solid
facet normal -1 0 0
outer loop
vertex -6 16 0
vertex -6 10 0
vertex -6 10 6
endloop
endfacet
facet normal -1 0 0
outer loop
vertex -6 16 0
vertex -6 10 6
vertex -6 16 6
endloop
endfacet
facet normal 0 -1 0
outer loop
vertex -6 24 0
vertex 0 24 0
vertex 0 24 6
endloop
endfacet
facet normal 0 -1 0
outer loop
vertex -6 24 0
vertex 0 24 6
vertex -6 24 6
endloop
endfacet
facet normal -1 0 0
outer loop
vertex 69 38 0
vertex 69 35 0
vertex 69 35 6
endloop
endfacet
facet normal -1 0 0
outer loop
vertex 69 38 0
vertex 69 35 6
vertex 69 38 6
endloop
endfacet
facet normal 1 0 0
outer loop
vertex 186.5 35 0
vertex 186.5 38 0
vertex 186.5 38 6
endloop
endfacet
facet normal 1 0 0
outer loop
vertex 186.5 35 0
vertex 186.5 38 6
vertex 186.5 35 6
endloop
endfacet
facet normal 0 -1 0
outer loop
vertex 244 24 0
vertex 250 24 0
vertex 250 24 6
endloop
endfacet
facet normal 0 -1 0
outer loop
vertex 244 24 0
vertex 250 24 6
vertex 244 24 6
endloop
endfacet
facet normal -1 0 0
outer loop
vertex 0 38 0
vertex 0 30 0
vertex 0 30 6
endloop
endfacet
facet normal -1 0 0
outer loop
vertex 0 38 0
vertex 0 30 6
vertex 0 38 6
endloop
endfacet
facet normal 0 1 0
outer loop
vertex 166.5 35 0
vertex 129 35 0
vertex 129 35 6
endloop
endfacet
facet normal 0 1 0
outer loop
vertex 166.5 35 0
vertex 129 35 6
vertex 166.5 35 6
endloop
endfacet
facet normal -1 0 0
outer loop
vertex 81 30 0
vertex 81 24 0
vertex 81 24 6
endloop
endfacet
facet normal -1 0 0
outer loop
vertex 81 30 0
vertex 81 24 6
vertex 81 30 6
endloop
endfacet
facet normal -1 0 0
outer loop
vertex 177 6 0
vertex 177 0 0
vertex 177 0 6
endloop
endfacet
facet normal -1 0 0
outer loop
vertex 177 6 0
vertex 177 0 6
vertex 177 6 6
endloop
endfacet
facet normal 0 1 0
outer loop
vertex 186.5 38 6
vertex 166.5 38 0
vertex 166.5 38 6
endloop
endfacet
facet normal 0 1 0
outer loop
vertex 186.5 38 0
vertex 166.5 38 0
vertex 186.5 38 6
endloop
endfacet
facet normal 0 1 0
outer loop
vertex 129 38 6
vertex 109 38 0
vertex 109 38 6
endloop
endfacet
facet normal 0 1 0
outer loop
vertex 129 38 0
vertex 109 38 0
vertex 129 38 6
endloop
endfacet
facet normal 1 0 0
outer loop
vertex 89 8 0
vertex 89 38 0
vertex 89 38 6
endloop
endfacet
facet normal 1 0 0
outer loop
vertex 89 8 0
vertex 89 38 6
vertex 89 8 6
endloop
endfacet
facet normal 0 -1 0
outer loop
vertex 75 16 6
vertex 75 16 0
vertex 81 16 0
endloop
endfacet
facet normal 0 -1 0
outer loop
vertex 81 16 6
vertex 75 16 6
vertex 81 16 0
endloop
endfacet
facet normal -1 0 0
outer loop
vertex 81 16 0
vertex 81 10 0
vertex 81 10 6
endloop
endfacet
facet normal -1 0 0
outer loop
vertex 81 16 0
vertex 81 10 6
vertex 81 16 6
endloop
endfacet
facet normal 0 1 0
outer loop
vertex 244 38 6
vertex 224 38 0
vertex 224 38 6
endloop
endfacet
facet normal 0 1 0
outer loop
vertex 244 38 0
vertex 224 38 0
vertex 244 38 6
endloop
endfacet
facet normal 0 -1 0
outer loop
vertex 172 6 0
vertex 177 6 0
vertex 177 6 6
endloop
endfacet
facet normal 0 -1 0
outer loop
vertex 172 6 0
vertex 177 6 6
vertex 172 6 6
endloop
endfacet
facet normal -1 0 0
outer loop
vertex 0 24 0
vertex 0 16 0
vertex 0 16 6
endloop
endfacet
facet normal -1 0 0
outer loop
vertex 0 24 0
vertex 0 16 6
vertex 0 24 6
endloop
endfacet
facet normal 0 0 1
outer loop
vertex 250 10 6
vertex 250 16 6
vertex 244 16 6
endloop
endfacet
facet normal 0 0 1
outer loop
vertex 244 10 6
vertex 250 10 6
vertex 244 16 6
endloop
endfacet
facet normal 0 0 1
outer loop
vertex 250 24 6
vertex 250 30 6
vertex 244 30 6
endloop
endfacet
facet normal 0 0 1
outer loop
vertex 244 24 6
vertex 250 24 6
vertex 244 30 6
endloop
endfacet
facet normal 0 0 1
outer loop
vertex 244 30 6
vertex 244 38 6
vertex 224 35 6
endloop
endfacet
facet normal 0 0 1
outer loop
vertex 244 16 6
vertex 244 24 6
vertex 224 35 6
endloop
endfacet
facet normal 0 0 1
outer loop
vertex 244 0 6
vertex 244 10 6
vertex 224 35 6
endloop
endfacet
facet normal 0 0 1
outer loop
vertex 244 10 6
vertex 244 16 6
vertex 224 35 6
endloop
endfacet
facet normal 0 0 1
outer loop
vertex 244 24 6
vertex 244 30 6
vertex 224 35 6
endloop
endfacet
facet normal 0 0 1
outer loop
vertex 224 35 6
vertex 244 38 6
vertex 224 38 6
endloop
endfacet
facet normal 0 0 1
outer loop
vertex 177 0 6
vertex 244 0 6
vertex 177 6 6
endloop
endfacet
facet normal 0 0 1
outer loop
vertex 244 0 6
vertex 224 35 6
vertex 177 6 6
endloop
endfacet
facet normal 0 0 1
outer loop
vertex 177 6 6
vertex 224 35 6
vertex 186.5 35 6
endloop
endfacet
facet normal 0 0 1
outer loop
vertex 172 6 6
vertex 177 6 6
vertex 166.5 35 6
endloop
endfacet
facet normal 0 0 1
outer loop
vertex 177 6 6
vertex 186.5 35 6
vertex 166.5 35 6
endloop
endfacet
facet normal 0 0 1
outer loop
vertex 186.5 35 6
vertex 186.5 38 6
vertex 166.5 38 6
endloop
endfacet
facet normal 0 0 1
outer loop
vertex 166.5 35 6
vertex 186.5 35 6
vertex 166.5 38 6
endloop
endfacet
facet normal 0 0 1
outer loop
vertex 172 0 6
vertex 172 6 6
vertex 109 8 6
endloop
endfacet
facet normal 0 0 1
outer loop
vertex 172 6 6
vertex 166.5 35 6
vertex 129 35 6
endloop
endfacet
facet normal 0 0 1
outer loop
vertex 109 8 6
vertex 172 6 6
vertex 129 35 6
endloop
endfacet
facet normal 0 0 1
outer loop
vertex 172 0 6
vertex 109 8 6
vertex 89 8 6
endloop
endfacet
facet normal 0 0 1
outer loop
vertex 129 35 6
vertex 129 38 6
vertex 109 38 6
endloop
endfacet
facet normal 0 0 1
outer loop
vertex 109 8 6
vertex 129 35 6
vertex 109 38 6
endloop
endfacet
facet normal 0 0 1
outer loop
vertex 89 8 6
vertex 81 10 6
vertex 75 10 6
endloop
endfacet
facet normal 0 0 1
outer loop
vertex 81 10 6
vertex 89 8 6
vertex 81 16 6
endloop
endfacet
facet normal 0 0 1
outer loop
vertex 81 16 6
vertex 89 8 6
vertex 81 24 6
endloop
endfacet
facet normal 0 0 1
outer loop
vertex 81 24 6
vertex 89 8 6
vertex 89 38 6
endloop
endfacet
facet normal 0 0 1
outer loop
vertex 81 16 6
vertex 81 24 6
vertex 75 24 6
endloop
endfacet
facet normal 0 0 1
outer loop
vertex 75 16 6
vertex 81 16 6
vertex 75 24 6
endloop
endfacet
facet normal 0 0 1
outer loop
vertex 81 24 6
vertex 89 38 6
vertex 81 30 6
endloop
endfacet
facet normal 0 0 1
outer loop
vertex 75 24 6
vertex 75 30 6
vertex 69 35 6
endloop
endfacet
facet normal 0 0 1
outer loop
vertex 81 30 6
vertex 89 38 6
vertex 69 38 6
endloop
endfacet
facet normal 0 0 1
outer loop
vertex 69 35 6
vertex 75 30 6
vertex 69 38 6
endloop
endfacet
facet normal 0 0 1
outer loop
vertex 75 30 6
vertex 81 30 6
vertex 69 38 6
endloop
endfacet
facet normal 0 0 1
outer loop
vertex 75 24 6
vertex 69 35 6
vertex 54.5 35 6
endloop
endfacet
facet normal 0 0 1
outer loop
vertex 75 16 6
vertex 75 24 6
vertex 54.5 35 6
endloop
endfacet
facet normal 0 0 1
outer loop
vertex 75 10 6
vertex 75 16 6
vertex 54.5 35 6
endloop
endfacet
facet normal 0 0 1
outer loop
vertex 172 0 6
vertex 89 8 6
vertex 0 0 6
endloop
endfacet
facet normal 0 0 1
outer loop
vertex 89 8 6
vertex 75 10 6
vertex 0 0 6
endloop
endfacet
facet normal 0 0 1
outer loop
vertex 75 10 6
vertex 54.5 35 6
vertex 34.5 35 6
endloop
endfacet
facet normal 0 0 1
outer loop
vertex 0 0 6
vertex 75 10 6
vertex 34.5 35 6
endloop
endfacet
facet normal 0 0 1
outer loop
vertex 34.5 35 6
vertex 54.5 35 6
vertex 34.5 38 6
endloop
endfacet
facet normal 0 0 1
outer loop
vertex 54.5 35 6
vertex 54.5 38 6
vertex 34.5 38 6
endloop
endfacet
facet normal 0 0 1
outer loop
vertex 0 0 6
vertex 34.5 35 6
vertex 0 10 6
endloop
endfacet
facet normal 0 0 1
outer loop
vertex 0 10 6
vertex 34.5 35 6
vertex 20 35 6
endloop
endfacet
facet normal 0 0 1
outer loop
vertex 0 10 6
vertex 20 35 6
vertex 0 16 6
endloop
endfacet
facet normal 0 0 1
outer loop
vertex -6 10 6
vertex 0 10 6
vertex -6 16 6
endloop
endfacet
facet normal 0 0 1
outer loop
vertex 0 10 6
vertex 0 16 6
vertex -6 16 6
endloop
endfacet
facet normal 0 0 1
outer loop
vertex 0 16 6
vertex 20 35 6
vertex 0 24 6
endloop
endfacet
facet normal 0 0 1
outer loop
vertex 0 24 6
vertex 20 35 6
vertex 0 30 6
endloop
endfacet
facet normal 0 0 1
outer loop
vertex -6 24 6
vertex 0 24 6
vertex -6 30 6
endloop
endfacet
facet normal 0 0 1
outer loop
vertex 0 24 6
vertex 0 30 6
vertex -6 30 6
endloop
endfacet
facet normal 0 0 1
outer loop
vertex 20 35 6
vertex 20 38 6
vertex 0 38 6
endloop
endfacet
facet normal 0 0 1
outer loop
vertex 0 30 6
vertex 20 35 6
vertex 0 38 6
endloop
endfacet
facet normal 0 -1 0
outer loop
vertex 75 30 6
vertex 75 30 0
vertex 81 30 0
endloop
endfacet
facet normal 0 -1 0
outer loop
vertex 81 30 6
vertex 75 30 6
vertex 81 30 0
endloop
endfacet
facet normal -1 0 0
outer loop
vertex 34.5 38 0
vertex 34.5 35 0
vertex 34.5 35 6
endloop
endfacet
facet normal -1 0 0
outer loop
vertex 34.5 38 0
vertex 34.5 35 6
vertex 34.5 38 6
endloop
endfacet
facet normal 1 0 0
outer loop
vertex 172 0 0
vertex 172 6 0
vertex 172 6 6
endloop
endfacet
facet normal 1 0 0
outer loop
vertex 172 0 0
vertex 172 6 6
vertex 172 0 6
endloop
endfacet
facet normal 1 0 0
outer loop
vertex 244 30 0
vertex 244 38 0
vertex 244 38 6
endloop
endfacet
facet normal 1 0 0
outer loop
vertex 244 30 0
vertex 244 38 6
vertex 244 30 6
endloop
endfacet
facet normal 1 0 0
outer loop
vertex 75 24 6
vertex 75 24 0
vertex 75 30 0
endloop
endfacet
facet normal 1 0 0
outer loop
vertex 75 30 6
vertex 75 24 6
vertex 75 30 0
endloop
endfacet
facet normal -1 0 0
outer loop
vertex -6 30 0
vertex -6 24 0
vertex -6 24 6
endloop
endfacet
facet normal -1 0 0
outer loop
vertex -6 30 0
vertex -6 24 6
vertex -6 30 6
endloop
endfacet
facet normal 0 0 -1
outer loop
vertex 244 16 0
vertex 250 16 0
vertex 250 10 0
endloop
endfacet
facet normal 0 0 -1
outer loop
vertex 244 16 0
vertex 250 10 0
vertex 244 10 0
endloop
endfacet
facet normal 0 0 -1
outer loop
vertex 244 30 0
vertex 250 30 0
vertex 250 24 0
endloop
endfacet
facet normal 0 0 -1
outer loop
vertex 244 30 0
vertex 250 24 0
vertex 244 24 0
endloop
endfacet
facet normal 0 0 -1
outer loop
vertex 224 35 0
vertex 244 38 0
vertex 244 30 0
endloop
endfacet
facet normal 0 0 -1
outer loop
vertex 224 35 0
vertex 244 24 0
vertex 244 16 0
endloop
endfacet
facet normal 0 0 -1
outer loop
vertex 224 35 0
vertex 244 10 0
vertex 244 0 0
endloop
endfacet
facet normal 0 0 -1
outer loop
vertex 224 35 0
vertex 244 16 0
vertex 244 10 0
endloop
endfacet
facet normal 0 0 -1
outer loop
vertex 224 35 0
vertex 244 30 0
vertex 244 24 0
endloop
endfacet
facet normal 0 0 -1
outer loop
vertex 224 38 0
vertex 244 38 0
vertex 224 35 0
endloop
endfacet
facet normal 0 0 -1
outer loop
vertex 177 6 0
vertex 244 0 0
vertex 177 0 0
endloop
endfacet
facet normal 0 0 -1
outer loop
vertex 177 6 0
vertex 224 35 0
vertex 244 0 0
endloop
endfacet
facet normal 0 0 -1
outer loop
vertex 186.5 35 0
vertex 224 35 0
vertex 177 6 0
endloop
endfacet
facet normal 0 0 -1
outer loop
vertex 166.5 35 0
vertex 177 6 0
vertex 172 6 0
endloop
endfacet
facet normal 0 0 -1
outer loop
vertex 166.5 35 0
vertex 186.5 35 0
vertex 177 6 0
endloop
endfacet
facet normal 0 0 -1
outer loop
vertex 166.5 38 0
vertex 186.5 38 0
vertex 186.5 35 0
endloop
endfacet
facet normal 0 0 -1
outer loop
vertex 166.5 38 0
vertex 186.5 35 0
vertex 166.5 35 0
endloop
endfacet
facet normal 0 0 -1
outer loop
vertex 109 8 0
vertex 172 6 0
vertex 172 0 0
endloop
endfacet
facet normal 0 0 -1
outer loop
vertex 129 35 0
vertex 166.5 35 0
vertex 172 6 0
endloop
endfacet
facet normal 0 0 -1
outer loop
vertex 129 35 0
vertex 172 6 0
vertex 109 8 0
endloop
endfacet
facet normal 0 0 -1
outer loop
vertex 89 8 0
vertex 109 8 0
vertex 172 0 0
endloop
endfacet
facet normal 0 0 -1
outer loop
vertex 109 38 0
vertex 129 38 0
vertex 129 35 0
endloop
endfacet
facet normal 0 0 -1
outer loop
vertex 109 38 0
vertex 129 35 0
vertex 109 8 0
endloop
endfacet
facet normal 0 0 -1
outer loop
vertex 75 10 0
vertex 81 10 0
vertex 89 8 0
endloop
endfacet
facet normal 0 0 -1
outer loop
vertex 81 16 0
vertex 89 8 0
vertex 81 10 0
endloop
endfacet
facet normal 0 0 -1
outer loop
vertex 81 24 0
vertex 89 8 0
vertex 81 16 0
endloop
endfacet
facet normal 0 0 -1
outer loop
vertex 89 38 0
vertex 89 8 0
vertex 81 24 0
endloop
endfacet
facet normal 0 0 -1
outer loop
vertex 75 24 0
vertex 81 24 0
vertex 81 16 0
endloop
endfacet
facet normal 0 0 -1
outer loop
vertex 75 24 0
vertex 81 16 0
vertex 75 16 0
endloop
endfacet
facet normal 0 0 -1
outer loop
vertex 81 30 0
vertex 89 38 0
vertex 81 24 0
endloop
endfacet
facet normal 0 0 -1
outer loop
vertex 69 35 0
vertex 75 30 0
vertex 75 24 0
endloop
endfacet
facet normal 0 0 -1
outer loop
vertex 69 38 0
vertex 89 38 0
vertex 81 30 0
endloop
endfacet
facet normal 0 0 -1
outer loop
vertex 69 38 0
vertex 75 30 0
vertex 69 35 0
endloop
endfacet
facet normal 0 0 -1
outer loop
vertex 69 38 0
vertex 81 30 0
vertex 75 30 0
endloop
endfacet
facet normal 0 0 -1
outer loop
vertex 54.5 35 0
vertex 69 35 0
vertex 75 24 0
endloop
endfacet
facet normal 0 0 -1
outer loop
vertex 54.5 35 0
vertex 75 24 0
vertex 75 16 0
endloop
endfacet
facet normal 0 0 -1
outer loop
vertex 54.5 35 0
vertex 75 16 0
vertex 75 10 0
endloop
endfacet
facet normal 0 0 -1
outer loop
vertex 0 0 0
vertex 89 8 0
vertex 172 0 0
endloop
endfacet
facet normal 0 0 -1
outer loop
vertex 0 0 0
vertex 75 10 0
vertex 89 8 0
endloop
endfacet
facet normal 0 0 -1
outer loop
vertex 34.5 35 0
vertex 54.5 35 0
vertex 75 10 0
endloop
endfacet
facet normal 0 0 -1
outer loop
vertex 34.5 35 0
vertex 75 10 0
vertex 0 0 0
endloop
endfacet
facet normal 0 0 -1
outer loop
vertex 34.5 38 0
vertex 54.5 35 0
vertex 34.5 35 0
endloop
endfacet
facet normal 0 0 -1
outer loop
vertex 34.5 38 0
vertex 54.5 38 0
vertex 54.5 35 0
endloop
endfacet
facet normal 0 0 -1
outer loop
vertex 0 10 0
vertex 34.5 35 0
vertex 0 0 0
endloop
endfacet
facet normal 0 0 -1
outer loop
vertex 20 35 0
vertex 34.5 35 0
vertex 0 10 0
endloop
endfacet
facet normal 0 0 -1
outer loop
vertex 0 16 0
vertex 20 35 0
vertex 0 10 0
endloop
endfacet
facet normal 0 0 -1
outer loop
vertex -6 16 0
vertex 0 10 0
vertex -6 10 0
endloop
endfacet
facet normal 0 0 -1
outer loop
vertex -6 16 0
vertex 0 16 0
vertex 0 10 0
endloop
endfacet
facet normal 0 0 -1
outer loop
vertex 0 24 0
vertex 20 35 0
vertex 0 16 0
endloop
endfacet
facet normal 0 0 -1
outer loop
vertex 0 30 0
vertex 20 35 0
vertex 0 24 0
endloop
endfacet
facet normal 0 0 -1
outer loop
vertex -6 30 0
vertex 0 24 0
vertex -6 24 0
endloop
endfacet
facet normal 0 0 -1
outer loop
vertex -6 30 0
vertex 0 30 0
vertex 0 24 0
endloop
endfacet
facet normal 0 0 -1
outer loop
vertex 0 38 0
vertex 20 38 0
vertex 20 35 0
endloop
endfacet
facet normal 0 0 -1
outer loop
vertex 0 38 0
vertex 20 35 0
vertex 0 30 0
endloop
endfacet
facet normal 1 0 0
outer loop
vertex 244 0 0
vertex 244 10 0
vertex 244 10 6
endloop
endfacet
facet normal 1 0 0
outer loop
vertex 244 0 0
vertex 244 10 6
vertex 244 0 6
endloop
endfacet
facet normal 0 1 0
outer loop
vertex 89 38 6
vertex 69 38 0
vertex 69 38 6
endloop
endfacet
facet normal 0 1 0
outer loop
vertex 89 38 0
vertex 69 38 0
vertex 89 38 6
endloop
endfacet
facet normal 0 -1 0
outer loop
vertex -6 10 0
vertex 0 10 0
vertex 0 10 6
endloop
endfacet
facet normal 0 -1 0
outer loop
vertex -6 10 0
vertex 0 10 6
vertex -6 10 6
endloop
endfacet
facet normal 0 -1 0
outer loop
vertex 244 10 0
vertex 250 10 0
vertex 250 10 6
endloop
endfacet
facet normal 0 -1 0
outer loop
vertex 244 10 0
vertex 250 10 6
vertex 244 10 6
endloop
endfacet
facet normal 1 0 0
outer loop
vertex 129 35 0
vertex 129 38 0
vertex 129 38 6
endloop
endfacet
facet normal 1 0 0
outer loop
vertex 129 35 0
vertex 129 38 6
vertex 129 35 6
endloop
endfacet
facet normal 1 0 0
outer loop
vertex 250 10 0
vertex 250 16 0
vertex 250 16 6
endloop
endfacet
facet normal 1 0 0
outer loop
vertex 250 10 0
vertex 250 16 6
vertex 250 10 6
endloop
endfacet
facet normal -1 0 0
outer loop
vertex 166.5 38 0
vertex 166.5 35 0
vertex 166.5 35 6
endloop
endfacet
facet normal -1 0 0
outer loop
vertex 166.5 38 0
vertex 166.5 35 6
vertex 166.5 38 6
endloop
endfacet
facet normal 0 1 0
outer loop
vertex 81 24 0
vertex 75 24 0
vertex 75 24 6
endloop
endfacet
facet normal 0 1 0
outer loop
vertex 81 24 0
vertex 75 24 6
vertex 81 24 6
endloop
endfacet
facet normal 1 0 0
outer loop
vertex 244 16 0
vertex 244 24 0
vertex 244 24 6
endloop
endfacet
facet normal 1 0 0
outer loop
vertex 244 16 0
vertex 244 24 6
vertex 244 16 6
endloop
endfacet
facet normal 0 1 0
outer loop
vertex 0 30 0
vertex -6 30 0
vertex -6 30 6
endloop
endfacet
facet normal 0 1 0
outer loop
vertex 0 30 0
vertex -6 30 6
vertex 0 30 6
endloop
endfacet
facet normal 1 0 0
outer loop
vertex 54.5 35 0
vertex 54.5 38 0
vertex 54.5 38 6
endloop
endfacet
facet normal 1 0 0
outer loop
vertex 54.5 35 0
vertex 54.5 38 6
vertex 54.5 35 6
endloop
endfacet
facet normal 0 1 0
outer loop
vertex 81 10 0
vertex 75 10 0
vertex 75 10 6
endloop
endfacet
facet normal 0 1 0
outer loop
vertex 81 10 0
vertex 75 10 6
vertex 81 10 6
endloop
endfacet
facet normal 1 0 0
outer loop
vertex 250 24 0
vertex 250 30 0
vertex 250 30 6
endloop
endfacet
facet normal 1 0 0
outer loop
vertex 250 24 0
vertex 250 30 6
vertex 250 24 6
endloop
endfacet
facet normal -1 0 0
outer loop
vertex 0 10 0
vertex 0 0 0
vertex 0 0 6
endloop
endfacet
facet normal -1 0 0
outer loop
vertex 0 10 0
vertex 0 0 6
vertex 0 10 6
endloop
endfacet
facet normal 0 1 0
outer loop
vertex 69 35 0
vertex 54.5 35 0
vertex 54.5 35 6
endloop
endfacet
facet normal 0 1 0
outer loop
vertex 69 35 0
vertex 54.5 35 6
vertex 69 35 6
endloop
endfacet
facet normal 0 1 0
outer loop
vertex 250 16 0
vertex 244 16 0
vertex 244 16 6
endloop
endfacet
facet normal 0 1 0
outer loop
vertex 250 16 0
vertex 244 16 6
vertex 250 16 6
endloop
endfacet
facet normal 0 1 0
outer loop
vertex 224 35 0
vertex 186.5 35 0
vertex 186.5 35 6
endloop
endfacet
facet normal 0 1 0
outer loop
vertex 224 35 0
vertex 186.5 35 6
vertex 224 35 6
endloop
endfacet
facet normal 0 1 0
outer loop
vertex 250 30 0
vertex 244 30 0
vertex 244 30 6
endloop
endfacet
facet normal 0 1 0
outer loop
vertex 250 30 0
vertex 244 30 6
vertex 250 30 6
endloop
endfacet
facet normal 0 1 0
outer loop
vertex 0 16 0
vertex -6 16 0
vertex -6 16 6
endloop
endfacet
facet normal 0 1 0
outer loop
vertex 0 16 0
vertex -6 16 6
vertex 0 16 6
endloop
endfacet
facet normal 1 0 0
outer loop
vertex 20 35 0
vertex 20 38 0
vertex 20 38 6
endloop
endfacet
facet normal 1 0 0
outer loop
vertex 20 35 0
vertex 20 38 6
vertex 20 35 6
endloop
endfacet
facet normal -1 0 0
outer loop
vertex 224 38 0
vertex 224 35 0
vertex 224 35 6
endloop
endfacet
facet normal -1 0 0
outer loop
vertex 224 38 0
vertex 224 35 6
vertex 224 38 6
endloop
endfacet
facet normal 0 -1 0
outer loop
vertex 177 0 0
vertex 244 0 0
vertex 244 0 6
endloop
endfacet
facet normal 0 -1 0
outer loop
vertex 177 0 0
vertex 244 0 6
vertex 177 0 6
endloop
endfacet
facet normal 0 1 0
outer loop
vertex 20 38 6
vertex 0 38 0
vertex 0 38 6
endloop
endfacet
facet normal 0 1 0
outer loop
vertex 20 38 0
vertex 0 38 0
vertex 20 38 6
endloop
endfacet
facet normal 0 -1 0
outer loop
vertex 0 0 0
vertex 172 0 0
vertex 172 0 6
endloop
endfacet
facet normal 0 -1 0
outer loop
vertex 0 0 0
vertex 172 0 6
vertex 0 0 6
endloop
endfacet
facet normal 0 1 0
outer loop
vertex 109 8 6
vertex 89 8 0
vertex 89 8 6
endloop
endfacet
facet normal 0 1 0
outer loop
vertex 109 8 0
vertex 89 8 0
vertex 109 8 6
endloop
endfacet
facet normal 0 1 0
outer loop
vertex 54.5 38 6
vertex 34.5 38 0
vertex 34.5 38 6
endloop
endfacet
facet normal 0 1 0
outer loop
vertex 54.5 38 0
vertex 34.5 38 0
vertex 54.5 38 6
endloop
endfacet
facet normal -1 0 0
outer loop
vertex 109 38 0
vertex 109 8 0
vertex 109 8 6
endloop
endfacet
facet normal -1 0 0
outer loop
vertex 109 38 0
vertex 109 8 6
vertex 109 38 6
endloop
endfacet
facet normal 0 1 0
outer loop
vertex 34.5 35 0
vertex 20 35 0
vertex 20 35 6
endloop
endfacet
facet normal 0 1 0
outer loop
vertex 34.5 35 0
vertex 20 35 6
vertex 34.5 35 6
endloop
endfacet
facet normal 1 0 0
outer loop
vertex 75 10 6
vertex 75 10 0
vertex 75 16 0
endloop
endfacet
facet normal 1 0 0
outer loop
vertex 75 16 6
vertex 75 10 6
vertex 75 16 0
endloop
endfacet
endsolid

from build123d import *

# Parameters (mm, degrees)
SKETCH_2_W      = 6
SKETCH_2_H      = 6
EXTRUDE_1_DEPTH = 6


with BuildPart() as part:
    # Эскиз2 → Бобышка-Вытянуть1 (new body)
    with BuildSketch(Plane.XY):
        Polygon((89, 38), (89, 8), (109, 8), (109, 38), (129, 38), (129, 35), (166.5, 35), (166.5, 38), (186.5, 38), (186.5, 35), (224, 35), (224, 38), (244, 38), (244, 30), (250, 30), (250, 24), (244, 24), (244, 16), (250, 16), (250, 10), (244, 10), (244, 0), (177, 0), (177, 6), (172, 6), (172, 0), (0, 0), (0, 10), (-6, 10), (-6, 16), (0, 16), (0, 24), (-6, 24), (-6, 30), (0, 30), (0, 38), (20, 38), (20, 35), (34.5, 35), (34.5, 38), (54.5, 38), (54.5, 35), (69, 35), (69, 38), align=None)
        with Locations((78, 27)):
            Rectangle(SKETCH_2_W, SKETCH_2_H, mode=Mode.SUBTRACT)
        with Locations((78, 13)):
            Rectangle(SKETCH_2_W, SKETCH_2_H, mode=Mode.SUBTRACT)
    extrude(amount=EXTRUDE_1_DEPTH)


solid = part.part
